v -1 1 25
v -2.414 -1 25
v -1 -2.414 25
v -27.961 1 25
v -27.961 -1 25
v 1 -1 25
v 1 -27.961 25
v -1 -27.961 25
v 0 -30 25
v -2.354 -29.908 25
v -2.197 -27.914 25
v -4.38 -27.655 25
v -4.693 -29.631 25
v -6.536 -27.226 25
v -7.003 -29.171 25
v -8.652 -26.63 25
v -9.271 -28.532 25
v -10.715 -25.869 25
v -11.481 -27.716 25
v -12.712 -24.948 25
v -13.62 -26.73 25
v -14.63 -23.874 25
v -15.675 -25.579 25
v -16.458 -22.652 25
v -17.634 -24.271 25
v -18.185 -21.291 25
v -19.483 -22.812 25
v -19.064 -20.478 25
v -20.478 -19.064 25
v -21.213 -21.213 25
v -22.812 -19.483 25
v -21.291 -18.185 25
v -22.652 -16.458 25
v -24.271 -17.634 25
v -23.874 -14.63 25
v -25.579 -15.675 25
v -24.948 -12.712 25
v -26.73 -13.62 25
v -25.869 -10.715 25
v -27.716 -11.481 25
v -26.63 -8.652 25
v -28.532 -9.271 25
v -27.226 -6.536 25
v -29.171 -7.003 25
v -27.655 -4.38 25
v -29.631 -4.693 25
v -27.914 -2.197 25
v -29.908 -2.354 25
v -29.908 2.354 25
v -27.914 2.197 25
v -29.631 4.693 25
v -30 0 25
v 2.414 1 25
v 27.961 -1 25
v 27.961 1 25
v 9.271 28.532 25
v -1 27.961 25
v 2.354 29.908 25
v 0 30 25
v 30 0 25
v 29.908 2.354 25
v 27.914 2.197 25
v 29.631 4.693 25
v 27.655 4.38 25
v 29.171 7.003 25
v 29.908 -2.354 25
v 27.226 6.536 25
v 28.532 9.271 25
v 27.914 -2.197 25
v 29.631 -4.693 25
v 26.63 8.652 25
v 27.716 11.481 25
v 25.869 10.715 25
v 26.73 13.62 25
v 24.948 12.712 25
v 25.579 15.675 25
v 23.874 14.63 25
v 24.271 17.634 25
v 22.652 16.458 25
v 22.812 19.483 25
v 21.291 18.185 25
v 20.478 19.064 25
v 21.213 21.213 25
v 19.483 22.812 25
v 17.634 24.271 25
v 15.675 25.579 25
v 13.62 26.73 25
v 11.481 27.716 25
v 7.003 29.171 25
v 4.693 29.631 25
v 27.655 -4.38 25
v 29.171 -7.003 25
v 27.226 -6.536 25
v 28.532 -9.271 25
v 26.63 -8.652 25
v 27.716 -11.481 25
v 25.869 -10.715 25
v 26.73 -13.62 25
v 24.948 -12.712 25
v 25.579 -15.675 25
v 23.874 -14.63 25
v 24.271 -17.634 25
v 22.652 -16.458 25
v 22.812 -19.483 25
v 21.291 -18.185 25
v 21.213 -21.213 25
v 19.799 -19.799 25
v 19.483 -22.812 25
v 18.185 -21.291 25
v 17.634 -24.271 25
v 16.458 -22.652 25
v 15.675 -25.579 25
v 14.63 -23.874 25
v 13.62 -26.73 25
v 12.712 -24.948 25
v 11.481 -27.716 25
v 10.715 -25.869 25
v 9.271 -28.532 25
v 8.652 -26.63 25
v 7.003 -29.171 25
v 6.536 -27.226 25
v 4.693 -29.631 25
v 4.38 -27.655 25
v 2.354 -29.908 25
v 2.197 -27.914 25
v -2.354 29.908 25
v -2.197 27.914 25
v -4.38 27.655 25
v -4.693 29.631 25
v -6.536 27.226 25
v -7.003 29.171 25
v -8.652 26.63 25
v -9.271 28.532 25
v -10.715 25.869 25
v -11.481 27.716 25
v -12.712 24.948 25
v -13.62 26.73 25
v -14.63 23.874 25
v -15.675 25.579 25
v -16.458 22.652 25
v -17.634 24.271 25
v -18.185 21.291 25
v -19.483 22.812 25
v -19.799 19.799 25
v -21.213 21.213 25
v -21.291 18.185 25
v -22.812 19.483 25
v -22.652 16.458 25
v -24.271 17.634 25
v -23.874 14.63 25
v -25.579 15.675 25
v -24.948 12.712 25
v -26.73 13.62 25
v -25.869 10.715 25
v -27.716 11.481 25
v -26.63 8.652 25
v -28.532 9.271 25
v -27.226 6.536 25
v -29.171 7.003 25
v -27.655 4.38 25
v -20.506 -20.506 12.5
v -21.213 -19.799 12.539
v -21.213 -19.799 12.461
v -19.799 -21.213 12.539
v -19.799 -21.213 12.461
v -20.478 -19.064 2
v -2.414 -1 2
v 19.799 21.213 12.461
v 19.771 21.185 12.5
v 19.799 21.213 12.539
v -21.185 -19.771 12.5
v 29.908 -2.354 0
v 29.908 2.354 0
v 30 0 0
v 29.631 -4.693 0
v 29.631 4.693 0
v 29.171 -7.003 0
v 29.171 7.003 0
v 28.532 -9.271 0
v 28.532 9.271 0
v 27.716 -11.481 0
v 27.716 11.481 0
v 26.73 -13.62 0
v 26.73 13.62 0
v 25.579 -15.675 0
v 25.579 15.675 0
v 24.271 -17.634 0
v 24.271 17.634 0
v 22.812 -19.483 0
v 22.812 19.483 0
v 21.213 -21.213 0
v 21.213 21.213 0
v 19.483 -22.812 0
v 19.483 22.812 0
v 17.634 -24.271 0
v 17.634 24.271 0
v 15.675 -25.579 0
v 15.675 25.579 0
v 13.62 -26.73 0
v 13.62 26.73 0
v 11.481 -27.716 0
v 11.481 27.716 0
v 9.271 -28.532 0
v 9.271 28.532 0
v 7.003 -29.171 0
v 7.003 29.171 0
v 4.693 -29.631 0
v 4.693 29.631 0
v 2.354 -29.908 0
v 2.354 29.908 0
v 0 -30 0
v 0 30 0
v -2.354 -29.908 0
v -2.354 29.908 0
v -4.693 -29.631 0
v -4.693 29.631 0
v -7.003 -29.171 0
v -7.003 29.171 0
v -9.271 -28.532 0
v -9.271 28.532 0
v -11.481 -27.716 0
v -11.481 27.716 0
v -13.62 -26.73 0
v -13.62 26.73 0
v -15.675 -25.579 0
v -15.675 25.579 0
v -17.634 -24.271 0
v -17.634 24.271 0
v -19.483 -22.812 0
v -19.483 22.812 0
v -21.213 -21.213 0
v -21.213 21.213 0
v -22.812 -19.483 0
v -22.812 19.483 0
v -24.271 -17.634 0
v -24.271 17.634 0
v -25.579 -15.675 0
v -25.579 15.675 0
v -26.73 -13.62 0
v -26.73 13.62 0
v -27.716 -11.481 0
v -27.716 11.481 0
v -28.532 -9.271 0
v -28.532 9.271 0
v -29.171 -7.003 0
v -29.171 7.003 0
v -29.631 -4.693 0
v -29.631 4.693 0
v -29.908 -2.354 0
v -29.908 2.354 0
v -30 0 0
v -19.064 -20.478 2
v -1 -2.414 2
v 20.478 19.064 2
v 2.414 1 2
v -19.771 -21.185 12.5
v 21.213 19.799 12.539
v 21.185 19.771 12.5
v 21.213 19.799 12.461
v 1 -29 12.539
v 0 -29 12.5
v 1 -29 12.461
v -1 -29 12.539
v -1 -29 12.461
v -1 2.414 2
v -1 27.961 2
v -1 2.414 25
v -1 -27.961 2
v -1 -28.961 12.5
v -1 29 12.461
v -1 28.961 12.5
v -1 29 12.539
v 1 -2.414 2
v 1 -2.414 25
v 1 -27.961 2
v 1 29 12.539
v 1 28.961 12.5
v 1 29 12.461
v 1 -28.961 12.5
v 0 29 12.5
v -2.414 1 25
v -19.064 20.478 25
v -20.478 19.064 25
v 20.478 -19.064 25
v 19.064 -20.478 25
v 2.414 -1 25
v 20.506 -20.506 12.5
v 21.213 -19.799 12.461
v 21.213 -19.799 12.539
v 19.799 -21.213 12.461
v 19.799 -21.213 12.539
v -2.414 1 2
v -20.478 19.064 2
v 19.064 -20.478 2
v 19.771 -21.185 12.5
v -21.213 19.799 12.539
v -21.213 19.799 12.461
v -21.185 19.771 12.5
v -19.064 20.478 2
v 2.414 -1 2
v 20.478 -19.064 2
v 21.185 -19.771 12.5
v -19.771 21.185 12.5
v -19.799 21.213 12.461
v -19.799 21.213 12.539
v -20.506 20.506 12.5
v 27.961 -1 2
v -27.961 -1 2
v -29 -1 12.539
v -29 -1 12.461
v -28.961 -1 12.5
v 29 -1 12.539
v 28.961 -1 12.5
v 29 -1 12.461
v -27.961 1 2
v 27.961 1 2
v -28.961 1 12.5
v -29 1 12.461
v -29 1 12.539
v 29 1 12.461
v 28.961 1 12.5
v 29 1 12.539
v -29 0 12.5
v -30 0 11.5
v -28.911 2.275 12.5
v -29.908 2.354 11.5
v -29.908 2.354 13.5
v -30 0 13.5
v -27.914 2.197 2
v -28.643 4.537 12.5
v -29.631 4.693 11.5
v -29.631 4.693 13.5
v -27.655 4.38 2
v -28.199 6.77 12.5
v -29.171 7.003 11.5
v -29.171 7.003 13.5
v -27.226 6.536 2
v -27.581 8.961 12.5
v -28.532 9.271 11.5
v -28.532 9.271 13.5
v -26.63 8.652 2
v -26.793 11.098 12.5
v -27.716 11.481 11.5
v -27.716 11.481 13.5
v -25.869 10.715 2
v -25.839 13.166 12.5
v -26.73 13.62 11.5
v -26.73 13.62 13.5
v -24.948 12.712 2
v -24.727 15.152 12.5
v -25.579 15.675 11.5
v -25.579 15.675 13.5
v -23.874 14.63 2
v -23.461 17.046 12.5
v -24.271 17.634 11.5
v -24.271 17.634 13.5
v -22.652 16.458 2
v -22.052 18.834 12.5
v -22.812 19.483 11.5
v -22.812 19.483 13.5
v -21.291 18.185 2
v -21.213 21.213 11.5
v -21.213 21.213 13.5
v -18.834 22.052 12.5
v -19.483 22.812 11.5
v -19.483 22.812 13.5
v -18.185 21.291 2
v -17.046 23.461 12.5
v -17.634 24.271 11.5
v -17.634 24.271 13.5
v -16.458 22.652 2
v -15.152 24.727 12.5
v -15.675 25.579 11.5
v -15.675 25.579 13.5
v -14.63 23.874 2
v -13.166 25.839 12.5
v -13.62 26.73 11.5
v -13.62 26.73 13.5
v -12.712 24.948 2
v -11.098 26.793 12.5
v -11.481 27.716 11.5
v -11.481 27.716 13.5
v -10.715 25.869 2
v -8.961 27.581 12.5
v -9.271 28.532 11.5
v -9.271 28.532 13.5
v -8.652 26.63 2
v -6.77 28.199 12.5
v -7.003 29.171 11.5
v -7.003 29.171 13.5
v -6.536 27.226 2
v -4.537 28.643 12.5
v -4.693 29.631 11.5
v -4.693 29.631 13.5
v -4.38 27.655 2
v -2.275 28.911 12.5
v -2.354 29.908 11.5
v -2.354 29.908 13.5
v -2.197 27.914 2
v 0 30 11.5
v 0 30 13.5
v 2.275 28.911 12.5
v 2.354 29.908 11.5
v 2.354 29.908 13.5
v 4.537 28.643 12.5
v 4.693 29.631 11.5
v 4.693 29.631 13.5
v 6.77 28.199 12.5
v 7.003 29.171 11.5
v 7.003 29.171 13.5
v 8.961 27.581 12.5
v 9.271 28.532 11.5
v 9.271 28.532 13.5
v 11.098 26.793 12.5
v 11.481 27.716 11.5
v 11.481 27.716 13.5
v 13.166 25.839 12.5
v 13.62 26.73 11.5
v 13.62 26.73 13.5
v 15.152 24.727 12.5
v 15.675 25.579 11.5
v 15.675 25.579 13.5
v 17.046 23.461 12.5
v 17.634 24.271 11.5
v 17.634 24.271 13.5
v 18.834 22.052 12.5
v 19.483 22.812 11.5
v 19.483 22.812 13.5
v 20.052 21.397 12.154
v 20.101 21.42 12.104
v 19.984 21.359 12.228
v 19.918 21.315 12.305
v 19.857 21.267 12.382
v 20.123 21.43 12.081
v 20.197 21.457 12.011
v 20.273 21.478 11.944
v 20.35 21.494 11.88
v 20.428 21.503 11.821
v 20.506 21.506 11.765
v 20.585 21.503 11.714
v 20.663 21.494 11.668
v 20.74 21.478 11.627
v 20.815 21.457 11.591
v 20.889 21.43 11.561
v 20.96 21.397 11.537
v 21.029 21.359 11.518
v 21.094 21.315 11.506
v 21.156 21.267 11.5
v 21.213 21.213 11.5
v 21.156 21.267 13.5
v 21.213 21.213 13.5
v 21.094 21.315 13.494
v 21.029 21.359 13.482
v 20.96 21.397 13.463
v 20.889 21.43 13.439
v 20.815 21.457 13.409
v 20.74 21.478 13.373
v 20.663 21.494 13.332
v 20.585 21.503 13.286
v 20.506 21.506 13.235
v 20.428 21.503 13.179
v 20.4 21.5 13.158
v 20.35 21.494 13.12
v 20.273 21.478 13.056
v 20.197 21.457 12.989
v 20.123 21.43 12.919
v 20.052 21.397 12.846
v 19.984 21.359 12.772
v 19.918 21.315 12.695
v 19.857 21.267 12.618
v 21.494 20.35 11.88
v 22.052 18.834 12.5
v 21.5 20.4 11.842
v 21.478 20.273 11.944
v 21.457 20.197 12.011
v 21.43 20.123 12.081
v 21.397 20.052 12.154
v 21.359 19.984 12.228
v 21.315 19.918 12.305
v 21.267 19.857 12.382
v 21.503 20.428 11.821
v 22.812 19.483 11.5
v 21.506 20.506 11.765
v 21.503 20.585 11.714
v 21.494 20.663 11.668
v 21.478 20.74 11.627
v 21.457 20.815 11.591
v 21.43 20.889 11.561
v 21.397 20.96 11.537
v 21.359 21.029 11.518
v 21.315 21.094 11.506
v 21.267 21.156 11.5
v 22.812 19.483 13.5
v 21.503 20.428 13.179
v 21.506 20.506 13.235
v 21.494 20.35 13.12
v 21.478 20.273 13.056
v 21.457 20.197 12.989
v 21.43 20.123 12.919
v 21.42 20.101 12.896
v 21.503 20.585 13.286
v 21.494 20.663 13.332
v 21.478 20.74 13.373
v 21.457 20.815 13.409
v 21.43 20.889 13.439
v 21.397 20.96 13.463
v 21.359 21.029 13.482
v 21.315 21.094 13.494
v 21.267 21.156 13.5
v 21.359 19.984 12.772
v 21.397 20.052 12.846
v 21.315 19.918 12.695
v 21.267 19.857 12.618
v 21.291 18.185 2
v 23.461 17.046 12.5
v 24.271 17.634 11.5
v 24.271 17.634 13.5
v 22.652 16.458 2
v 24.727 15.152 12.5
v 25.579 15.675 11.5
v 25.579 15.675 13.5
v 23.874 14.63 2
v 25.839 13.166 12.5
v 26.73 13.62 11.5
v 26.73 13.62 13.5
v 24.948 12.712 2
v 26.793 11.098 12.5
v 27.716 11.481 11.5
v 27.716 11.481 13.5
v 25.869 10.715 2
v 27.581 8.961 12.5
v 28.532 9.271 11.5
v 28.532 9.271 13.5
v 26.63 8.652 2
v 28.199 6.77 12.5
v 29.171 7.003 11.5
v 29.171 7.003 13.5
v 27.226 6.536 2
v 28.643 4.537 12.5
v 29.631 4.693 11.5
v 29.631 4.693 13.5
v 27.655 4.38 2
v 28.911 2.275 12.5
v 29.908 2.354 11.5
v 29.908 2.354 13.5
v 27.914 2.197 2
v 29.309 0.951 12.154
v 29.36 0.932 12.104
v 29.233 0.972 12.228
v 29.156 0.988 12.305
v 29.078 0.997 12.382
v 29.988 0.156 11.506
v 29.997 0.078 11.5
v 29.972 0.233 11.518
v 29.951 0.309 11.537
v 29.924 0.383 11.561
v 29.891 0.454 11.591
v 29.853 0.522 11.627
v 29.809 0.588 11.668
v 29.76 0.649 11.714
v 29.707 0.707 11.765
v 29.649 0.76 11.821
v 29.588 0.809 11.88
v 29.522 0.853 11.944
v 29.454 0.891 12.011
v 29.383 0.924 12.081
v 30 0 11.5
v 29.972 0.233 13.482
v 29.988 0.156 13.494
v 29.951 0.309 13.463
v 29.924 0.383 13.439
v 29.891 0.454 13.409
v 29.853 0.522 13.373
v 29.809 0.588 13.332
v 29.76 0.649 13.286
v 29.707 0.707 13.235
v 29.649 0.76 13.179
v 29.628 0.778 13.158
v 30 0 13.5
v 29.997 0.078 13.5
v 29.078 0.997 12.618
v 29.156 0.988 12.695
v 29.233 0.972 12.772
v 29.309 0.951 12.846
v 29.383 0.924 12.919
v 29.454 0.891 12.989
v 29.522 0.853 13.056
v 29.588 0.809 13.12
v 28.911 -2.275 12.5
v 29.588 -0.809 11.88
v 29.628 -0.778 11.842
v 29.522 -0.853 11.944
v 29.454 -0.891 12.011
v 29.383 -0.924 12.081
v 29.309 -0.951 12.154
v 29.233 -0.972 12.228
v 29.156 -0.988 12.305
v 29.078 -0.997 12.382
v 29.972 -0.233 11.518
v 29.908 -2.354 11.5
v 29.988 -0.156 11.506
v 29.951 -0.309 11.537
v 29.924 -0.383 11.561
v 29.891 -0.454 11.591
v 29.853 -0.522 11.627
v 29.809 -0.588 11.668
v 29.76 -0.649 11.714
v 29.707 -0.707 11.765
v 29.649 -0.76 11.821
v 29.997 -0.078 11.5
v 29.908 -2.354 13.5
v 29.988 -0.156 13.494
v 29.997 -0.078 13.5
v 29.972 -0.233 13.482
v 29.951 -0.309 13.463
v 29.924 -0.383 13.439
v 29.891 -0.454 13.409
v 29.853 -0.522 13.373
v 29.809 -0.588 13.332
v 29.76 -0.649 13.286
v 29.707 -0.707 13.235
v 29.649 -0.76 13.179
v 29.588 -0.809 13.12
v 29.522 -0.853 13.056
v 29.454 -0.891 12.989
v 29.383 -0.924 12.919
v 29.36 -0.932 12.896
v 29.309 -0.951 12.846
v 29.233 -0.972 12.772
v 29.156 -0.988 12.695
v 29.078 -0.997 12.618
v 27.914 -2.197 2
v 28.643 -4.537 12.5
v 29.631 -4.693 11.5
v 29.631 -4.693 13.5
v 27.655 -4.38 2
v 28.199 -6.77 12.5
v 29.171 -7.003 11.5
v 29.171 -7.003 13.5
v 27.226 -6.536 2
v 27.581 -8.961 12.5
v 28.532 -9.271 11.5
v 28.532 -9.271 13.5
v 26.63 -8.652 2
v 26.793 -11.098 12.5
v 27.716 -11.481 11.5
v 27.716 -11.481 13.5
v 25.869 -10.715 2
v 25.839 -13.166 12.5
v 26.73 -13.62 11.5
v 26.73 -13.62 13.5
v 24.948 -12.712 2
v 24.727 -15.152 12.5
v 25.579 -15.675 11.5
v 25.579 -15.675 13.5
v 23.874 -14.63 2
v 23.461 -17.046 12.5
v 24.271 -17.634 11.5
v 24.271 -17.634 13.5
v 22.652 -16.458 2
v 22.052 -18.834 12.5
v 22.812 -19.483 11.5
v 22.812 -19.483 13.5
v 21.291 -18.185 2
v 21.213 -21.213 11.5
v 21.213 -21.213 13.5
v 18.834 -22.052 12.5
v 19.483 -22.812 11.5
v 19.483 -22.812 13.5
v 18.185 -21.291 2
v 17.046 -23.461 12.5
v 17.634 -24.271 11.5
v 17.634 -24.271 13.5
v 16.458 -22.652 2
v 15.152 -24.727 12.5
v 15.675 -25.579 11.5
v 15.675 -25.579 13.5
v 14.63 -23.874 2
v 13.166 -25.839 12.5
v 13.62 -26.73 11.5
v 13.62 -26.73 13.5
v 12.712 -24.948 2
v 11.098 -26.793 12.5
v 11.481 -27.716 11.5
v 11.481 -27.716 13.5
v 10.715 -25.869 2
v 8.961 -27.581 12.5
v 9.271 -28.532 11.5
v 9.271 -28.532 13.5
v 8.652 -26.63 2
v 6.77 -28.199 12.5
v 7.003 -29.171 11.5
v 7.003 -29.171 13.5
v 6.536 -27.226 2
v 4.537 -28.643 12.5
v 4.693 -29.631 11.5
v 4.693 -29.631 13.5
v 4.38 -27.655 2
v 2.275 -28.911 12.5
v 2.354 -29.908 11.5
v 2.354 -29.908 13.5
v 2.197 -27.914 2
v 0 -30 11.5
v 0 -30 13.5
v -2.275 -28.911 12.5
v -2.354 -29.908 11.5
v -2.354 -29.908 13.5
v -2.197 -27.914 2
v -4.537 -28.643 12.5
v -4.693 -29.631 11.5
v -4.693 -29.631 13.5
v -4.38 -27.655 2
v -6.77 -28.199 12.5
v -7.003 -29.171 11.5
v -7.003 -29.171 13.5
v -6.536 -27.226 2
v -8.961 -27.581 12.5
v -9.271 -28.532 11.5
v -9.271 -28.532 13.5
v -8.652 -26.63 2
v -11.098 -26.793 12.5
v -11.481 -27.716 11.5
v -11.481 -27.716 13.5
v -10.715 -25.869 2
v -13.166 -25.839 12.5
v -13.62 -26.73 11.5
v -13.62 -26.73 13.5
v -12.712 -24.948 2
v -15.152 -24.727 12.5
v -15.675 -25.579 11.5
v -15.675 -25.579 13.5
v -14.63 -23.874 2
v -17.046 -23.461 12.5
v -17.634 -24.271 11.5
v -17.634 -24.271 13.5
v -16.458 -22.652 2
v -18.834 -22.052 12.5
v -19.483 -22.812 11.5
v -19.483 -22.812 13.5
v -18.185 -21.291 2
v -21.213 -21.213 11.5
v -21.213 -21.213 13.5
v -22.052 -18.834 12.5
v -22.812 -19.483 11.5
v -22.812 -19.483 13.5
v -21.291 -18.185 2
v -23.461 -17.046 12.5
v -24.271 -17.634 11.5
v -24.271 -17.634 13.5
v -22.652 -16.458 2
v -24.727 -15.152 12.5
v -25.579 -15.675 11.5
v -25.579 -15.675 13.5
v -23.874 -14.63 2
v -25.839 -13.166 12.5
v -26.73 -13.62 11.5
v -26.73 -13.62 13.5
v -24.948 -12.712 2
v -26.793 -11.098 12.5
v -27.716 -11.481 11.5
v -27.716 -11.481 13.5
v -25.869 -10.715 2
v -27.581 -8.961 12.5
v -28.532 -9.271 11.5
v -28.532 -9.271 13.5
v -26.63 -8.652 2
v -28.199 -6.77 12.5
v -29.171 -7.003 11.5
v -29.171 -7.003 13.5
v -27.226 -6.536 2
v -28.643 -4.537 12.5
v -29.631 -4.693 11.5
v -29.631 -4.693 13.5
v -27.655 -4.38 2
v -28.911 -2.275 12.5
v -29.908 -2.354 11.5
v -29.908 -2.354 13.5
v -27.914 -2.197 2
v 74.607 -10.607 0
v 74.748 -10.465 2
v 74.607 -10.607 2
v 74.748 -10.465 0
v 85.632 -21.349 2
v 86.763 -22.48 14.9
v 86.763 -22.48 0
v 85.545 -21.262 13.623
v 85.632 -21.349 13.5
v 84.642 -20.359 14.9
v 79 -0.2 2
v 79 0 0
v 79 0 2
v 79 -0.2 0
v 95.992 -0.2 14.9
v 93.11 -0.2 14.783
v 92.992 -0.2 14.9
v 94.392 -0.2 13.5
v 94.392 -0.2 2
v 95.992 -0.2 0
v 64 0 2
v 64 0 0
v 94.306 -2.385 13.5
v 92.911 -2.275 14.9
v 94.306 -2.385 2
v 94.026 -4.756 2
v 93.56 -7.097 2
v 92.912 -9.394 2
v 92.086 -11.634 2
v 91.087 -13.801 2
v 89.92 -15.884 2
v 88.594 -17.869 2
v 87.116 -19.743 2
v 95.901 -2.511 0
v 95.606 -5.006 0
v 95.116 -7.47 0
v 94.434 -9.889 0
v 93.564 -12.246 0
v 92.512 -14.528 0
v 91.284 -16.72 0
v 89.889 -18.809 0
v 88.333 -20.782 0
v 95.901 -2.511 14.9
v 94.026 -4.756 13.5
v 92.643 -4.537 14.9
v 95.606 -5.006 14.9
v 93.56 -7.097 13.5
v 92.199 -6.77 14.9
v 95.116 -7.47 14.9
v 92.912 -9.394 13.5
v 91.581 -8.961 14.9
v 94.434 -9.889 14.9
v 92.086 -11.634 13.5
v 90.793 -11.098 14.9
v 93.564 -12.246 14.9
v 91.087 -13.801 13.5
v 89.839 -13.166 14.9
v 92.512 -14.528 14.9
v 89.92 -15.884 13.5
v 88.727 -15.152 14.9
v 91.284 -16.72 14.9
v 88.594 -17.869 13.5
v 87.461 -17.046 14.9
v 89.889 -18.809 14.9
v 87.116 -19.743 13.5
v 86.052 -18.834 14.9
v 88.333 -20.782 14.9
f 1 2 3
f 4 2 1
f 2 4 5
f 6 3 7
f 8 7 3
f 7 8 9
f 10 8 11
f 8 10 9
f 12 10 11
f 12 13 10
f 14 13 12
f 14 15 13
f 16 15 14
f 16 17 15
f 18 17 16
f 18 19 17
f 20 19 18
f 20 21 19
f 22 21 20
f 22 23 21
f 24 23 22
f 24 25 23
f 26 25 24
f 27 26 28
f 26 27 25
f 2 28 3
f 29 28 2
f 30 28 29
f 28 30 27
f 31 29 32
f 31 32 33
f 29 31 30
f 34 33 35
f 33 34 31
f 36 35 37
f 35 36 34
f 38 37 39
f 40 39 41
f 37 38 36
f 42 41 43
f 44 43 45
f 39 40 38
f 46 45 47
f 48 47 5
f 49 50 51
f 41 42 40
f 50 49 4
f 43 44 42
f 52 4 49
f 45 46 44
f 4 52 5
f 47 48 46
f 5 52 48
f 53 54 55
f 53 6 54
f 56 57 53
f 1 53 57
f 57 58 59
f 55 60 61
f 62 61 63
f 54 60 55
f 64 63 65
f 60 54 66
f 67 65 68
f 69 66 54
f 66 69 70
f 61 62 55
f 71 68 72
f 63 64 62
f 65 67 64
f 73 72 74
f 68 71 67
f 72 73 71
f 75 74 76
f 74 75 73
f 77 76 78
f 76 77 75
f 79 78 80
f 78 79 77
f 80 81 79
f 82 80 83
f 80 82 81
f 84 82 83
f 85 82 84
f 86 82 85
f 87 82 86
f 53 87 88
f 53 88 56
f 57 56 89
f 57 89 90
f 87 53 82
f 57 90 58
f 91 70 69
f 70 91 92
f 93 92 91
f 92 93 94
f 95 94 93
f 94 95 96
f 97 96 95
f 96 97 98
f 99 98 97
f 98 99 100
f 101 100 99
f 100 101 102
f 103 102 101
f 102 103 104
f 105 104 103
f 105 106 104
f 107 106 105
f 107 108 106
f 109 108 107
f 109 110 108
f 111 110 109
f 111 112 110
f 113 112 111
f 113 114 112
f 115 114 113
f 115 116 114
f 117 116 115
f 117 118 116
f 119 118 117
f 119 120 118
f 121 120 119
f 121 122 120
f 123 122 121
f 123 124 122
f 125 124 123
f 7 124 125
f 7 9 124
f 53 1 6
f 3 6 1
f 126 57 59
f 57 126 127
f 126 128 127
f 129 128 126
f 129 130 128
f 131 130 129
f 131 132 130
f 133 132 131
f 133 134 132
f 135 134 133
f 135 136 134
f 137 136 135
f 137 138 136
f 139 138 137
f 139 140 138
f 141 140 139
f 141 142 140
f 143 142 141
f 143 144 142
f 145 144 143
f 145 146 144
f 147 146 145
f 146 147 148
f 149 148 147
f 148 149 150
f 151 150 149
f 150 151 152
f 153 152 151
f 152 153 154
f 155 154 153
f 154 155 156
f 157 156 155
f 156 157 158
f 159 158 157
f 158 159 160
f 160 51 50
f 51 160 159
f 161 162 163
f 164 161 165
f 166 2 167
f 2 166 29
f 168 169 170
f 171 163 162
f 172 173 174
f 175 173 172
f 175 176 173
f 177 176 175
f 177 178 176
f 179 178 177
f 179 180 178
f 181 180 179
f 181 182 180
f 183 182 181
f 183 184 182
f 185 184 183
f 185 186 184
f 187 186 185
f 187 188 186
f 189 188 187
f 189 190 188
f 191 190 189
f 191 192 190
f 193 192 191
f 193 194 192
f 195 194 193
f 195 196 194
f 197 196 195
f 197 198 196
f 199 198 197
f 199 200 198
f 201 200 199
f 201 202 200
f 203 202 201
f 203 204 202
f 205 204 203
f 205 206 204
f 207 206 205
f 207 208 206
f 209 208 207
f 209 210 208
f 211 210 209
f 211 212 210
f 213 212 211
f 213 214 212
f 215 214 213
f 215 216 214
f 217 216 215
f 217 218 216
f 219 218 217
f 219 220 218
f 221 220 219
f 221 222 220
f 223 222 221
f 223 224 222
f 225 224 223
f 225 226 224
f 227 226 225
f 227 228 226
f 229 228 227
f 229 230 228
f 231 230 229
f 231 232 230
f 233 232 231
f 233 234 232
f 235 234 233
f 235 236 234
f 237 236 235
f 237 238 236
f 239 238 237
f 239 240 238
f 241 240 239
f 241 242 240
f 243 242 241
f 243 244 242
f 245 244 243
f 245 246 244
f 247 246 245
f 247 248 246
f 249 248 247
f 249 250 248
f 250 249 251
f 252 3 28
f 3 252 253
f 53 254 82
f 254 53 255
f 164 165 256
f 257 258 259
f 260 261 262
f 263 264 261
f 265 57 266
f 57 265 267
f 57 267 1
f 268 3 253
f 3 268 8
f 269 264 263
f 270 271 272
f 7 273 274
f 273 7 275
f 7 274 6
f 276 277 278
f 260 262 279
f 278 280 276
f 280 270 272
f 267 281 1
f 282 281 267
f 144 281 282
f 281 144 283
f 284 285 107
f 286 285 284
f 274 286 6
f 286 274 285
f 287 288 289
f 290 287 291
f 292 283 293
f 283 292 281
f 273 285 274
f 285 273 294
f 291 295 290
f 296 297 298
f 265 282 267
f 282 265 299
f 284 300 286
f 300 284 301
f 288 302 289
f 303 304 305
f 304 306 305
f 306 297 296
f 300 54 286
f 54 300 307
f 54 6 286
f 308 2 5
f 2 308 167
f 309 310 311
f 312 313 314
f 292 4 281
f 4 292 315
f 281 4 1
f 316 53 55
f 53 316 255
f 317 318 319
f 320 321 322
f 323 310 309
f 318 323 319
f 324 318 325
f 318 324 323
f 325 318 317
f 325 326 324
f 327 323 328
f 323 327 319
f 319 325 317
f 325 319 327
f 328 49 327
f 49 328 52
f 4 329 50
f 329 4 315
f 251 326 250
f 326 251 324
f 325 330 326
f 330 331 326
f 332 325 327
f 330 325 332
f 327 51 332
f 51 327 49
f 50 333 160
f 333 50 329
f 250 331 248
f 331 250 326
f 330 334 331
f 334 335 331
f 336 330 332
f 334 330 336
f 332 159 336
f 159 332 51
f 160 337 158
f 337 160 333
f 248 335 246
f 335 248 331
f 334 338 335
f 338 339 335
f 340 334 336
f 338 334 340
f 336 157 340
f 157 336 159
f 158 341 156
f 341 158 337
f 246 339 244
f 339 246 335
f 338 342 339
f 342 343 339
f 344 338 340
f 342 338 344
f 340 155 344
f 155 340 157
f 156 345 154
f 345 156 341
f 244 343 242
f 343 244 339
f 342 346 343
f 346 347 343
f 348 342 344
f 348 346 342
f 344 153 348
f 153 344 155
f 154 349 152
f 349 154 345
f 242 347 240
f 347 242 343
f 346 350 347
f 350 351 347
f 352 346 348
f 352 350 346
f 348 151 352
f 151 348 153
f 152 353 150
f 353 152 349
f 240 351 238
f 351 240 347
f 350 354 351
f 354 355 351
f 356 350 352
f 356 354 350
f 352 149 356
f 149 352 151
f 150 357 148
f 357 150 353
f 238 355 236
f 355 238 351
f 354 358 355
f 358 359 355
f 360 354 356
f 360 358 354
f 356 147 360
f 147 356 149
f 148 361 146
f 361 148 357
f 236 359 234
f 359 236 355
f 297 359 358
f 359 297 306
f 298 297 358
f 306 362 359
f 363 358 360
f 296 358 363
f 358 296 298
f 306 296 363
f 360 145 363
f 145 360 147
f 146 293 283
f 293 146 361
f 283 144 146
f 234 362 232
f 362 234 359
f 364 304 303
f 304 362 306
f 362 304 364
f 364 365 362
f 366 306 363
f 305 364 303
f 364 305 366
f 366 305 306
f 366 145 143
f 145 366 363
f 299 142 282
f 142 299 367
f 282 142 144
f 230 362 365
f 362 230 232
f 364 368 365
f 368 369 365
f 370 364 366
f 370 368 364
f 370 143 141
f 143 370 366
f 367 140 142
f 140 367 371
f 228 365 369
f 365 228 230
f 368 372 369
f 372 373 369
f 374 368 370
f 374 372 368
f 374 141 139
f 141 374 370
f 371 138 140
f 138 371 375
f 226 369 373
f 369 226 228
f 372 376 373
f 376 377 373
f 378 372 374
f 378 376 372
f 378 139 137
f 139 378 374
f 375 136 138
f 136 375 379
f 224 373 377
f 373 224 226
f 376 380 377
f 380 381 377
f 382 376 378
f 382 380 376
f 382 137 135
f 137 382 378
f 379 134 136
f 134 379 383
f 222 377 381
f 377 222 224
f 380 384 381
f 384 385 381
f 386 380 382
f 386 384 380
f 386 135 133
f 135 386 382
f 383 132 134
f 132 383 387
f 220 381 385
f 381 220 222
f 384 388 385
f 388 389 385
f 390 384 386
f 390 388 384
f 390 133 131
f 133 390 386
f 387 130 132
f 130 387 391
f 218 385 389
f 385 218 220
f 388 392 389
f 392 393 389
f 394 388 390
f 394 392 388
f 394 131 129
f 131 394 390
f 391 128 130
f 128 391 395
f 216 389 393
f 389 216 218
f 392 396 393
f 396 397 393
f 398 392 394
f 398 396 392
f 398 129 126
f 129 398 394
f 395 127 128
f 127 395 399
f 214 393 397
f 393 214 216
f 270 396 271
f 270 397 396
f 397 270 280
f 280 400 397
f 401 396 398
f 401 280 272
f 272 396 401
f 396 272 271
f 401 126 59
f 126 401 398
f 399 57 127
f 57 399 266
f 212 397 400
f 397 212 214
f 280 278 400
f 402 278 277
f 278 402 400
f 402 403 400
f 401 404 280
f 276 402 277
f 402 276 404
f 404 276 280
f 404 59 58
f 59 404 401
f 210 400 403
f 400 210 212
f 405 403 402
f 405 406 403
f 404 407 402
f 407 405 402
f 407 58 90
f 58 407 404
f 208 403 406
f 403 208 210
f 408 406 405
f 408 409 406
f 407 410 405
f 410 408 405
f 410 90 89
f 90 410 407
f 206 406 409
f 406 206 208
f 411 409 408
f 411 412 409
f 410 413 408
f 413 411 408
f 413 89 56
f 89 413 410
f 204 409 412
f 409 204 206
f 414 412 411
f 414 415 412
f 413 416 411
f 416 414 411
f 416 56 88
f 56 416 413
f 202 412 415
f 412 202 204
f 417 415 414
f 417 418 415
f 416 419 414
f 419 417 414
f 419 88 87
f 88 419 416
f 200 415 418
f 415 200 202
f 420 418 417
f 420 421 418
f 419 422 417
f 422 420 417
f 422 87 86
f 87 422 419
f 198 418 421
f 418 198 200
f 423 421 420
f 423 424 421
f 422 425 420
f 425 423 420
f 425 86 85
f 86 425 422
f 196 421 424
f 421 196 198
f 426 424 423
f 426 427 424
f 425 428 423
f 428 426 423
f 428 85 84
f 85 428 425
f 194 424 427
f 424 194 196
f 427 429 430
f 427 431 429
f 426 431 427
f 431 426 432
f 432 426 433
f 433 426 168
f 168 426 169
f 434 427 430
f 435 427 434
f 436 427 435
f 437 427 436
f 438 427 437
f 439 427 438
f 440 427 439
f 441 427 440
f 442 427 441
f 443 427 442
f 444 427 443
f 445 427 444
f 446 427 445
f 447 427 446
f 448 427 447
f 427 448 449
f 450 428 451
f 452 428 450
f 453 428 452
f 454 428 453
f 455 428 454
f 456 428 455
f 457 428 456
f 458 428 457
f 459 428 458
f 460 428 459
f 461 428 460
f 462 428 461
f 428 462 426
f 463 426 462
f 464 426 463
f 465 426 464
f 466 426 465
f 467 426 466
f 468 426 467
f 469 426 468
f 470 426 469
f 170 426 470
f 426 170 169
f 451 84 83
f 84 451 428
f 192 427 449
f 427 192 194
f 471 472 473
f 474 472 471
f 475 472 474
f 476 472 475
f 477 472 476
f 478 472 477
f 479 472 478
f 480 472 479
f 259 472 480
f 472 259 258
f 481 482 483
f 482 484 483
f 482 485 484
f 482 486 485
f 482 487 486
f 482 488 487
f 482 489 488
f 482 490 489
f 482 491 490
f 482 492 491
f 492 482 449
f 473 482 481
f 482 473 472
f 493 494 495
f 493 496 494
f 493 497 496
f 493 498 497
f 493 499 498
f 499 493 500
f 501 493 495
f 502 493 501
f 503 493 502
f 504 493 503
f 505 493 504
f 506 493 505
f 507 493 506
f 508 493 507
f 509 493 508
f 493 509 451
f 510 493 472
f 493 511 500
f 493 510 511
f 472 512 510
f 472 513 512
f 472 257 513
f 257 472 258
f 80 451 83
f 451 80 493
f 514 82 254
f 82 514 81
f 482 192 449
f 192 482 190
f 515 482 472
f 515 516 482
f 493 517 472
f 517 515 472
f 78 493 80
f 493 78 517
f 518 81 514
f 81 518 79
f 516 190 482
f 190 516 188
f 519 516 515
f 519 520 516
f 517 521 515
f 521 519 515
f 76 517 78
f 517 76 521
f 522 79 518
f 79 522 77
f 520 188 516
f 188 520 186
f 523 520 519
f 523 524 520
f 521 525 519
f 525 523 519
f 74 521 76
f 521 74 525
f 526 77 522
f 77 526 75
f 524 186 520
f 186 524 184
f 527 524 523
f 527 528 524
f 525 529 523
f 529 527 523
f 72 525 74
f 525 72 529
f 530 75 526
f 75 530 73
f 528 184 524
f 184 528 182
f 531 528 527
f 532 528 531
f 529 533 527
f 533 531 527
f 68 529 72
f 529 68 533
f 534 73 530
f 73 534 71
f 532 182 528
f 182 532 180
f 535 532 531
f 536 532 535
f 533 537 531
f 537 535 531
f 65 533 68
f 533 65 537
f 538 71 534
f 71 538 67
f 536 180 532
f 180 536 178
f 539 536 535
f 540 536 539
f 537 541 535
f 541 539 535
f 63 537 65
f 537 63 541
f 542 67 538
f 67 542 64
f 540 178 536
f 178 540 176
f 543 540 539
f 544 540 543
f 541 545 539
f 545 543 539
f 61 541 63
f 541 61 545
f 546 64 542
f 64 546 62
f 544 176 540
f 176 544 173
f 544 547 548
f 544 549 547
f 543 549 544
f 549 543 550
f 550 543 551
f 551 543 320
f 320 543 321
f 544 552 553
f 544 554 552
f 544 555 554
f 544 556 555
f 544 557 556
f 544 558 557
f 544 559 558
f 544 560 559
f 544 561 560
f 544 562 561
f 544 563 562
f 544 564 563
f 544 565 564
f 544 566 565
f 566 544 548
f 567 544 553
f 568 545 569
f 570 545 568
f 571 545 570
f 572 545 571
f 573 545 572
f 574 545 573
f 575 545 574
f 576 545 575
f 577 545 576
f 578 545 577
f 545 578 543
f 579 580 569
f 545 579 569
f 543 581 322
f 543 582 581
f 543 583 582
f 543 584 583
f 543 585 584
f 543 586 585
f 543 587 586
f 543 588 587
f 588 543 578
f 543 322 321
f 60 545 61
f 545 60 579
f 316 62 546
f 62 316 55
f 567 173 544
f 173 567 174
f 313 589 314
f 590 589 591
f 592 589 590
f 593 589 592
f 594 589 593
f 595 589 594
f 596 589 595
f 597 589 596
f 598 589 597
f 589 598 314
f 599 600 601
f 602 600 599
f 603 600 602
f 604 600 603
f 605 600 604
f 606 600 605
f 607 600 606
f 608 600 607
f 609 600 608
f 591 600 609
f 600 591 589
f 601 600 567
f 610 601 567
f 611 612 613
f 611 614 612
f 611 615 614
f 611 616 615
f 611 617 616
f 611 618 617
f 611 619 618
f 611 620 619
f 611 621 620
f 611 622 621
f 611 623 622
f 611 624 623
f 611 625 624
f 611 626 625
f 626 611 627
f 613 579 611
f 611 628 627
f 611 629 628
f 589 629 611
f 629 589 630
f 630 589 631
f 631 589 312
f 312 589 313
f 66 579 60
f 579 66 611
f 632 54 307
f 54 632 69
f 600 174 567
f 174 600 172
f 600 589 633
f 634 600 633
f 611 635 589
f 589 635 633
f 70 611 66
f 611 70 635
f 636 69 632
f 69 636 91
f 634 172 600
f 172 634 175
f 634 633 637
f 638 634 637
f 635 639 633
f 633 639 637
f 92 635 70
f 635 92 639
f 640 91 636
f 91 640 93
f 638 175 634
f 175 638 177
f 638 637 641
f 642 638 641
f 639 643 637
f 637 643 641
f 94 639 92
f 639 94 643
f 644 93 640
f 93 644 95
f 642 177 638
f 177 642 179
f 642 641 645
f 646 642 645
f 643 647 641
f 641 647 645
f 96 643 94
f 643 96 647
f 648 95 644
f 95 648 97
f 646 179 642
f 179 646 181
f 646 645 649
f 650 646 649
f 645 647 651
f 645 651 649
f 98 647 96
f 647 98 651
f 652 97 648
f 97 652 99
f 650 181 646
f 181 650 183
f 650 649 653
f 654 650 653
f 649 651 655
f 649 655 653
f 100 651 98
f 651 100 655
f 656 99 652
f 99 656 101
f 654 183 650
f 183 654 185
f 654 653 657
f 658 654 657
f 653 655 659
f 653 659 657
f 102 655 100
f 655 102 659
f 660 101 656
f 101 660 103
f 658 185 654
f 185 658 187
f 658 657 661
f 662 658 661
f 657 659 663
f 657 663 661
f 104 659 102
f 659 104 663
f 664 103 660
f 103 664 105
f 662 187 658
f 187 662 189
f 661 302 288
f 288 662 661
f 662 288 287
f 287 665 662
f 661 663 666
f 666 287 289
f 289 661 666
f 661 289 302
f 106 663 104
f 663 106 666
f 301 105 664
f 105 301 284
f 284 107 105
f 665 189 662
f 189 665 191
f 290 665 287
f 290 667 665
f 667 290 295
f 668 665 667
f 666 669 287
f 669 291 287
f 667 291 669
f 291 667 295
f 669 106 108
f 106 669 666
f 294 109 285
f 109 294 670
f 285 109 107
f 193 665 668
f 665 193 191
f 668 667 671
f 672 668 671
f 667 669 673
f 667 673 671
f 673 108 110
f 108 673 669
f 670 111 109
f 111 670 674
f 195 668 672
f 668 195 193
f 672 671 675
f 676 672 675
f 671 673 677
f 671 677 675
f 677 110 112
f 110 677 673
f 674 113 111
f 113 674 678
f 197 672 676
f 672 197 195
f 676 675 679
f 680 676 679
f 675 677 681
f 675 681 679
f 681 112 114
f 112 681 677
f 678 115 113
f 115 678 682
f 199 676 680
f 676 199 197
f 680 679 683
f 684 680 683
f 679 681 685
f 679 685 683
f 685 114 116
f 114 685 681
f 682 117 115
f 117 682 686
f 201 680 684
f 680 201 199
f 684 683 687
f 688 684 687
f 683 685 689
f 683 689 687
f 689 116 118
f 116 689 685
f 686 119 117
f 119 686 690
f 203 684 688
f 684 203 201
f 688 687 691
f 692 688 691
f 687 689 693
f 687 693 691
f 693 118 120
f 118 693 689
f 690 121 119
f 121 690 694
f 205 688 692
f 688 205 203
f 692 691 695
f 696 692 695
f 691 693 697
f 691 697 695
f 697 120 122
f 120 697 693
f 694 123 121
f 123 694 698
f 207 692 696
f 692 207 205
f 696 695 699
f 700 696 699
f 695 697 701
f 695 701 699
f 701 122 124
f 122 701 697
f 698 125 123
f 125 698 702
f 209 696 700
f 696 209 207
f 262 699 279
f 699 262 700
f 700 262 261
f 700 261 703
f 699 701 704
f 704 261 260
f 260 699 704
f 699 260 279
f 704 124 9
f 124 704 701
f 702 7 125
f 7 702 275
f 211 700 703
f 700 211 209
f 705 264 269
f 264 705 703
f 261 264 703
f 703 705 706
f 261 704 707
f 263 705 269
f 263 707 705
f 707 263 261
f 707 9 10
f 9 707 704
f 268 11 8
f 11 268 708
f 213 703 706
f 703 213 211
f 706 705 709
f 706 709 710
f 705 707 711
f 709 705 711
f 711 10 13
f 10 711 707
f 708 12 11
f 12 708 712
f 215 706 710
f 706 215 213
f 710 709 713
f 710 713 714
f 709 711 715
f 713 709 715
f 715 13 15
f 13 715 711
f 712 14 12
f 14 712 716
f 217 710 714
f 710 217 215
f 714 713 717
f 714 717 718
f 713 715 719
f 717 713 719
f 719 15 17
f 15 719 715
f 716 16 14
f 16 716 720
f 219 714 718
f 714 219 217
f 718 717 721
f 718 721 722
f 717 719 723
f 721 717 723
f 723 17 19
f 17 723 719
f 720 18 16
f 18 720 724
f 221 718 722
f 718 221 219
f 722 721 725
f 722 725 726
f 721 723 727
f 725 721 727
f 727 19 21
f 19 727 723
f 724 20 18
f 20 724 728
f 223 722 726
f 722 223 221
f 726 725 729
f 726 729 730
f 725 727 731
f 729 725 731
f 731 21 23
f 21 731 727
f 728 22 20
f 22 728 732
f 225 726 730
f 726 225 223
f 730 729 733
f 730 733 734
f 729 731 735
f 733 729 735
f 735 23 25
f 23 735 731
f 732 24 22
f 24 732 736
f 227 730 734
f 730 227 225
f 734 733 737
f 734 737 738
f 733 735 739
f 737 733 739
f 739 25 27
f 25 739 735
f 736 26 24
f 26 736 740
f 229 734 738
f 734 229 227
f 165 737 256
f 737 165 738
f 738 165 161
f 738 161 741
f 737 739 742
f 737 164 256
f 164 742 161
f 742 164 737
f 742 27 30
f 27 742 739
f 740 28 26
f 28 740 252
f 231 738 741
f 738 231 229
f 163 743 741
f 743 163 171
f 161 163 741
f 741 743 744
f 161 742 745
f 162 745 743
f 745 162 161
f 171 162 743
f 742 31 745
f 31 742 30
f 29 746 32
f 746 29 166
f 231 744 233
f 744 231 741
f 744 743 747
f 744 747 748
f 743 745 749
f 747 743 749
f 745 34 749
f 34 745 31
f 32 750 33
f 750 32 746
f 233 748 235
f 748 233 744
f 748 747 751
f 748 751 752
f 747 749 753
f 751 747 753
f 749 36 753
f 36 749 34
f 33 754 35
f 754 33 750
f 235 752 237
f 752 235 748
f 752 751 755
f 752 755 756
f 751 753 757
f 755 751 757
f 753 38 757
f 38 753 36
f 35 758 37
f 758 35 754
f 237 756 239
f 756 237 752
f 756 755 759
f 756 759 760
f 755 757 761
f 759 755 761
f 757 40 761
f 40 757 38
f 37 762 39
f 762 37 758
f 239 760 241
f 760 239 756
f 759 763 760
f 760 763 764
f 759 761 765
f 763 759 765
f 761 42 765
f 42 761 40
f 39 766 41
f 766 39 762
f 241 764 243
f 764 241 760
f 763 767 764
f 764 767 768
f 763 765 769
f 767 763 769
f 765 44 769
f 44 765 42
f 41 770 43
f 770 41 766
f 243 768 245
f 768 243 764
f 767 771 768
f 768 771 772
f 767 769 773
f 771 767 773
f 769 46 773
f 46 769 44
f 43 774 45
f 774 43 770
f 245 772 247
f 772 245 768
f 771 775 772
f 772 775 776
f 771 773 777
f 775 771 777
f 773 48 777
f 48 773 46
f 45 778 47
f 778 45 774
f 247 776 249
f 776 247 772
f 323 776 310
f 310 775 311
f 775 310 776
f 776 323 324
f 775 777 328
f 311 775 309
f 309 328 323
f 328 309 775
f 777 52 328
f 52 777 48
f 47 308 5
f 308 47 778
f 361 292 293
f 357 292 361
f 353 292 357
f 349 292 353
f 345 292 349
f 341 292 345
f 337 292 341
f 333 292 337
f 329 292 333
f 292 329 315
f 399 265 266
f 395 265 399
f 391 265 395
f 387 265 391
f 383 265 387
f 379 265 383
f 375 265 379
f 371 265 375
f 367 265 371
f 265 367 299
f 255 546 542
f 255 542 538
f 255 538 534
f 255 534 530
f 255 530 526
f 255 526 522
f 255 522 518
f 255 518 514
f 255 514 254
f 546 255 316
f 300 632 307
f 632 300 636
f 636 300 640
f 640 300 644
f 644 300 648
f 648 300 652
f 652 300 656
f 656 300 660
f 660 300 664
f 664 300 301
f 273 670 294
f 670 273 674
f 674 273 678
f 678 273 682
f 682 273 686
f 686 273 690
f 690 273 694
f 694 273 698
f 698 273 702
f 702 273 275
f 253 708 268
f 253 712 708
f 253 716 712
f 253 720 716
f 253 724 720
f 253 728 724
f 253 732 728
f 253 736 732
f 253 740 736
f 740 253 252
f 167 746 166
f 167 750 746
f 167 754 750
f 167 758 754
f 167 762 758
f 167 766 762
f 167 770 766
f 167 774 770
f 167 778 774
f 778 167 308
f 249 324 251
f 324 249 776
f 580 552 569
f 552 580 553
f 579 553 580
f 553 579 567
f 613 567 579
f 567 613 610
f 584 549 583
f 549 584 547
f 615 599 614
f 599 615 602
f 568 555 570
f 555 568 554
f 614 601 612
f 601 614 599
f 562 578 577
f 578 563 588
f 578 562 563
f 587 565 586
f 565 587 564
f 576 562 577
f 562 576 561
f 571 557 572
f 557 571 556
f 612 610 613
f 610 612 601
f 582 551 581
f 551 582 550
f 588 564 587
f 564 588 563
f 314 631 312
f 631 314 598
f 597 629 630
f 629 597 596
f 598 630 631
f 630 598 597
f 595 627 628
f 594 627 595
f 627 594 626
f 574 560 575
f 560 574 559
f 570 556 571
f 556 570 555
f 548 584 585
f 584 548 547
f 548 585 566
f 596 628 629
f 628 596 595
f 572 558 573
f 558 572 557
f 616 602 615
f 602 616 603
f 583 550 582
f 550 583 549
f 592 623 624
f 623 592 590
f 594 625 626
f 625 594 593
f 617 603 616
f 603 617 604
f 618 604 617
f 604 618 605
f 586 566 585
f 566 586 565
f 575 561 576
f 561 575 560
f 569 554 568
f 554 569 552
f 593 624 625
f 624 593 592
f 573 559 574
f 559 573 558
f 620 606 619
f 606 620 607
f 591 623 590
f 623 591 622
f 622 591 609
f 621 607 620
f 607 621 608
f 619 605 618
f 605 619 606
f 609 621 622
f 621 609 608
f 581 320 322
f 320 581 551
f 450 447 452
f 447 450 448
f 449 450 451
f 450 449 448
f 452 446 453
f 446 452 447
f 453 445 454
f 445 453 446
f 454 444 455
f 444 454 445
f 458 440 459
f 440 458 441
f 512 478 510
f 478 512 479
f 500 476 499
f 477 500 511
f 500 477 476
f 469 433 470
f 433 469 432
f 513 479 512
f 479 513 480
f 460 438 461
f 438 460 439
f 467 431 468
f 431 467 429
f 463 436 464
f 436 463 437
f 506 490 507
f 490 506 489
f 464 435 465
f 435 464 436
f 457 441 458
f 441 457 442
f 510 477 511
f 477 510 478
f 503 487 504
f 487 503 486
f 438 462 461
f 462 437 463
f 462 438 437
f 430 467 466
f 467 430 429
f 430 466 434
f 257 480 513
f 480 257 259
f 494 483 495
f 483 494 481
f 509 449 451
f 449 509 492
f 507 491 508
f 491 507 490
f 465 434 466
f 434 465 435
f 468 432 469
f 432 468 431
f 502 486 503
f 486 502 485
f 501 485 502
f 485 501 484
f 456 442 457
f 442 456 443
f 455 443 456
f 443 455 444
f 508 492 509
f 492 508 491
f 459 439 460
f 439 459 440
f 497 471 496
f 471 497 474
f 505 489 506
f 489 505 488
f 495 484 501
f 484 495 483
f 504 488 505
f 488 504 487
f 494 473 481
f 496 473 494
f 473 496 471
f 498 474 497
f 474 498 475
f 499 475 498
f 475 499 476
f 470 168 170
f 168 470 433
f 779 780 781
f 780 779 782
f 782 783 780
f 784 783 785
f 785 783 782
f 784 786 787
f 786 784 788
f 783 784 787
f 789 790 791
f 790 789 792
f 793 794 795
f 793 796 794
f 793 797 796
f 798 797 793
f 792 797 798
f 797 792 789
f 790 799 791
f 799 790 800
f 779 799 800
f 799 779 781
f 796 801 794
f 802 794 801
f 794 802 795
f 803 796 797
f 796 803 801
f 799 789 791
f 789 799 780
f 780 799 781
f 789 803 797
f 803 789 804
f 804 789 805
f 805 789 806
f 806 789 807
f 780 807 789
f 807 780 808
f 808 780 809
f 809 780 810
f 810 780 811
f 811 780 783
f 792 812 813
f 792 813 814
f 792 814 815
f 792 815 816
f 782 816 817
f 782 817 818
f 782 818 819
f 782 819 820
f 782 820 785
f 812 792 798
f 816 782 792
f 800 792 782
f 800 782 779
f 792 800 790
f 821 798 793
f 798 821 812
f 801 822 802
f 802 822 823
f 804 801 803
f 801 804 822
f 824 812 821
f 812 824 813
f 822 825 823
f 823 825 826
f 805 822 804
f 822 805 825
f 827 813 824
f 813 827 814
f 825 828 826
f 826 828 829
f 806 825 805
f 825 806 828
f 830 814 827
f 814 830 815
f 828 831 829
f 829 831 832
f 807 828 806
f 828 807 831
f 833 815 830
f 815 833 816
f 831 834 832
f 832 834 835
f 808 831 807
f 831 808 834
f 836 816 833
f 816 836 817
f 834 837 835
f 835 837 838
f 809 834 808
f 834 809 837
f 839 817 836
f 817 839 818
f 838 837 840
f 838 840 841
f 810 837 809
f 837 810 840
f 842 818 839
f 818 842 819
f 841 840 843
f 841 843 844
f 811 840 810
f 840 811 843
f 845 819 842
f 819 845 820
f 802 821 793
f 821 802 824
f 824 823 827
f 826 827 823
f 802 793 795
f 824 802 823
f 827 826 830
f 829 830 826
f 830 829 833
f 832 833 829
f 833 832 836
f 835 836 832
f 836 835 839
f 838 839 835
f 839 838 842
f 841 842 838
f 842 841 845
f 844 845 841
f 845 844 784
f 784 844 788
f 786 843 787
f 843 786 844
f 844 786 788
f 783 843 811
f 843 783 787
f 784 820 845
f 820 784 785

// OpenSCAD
// - Outer diameter of body
D = 60;

// - inside height of body
H = 25;

// - wall thickness 
t = 2;

// - Show as packed or assembled?
print = "false"; //[true:Print version, false:Assembled]




/* [hidden] */
$fn=80;
c = 0.4;
R = D/2;
unitVol = (3.14159*pow(R-t,2) - (R-t)*t )*H /1000;
echo(unitVol, "cm^3");

//Body();
//Lid();
//if(print="true") 
PrintConfig(); 
//else FitConfig();

module Body() {
    //body polygon
    pBody = [
        [0,         0],
        [D/2,       0],
        [D/2,       H/2-t/2],
        [D/2-t/2,   H/2],
        [D/2,       H/2+t/2],
        [D/2,       H],
        [D/2-t,     H],
        [D/2-t,     t],
        [0,         t]];
    rotate_extrude(angle=360, convexity=50) {
        polygon(pBody);
    }
    //walls
    for(i=[45:45:180]) {
        rotate(i) translate([-D/2+t/2, -t/2, 0]) {
            cube([D-t, t, H]);
        }
    } 
    //filled segment. E-NE
    intersection() {
        linear_extrude(H) polygon([[0,0],[0,D],[D,D]]); 
        cylinder(d=D-t,H);
    }
    //notches at E & NE
    rotate(0) translate([R-t/2,0,0]) {
        cylinder(d=t,H);
    }
    rotate(45) translate([R-t/2,0,0]) {
        cylinder(d=t,H);
    }
}


module Lid() {
    //lid polygon
    pLid = [
        [0,         H+c],
        [D/2+c,     H+c],
        [D/2+c,     H/2+t/2+c],
        [D/2-t/2,   H/2],
        [D/2+t,     H/2],
        [D/2+t,     H+c+t],
        [0,         H+c+t]];
    
    difference() {
        //body
        rotate_extrude(angle=45) {
            polygon(pLid);
        }
        //splits
        for(a=[45:45:360]) {
            rotate(a) translate([D/4, -c/2]) {
                cube([D,c,H*2]);
            }
        }
        //opening
        difference() {
            //triangular wedge
            linear_extrude(H*2) polygon([[0,0],[0,D],[D,D]]);
            //central cylinder
            cylinder(d=D/2,H*2);
        }
        
    }    
}

module PrintConfig() {
    Body();
    rotate([180,0,0]) translate([D+t*2, 0, -H-t-c]) {
        Lid();
    }
}


module FitConfig() {    
    intersection() {
        union() {
            Body();
            Lid();
        }
        rotate(-45/2) cube(D);
    }
}
